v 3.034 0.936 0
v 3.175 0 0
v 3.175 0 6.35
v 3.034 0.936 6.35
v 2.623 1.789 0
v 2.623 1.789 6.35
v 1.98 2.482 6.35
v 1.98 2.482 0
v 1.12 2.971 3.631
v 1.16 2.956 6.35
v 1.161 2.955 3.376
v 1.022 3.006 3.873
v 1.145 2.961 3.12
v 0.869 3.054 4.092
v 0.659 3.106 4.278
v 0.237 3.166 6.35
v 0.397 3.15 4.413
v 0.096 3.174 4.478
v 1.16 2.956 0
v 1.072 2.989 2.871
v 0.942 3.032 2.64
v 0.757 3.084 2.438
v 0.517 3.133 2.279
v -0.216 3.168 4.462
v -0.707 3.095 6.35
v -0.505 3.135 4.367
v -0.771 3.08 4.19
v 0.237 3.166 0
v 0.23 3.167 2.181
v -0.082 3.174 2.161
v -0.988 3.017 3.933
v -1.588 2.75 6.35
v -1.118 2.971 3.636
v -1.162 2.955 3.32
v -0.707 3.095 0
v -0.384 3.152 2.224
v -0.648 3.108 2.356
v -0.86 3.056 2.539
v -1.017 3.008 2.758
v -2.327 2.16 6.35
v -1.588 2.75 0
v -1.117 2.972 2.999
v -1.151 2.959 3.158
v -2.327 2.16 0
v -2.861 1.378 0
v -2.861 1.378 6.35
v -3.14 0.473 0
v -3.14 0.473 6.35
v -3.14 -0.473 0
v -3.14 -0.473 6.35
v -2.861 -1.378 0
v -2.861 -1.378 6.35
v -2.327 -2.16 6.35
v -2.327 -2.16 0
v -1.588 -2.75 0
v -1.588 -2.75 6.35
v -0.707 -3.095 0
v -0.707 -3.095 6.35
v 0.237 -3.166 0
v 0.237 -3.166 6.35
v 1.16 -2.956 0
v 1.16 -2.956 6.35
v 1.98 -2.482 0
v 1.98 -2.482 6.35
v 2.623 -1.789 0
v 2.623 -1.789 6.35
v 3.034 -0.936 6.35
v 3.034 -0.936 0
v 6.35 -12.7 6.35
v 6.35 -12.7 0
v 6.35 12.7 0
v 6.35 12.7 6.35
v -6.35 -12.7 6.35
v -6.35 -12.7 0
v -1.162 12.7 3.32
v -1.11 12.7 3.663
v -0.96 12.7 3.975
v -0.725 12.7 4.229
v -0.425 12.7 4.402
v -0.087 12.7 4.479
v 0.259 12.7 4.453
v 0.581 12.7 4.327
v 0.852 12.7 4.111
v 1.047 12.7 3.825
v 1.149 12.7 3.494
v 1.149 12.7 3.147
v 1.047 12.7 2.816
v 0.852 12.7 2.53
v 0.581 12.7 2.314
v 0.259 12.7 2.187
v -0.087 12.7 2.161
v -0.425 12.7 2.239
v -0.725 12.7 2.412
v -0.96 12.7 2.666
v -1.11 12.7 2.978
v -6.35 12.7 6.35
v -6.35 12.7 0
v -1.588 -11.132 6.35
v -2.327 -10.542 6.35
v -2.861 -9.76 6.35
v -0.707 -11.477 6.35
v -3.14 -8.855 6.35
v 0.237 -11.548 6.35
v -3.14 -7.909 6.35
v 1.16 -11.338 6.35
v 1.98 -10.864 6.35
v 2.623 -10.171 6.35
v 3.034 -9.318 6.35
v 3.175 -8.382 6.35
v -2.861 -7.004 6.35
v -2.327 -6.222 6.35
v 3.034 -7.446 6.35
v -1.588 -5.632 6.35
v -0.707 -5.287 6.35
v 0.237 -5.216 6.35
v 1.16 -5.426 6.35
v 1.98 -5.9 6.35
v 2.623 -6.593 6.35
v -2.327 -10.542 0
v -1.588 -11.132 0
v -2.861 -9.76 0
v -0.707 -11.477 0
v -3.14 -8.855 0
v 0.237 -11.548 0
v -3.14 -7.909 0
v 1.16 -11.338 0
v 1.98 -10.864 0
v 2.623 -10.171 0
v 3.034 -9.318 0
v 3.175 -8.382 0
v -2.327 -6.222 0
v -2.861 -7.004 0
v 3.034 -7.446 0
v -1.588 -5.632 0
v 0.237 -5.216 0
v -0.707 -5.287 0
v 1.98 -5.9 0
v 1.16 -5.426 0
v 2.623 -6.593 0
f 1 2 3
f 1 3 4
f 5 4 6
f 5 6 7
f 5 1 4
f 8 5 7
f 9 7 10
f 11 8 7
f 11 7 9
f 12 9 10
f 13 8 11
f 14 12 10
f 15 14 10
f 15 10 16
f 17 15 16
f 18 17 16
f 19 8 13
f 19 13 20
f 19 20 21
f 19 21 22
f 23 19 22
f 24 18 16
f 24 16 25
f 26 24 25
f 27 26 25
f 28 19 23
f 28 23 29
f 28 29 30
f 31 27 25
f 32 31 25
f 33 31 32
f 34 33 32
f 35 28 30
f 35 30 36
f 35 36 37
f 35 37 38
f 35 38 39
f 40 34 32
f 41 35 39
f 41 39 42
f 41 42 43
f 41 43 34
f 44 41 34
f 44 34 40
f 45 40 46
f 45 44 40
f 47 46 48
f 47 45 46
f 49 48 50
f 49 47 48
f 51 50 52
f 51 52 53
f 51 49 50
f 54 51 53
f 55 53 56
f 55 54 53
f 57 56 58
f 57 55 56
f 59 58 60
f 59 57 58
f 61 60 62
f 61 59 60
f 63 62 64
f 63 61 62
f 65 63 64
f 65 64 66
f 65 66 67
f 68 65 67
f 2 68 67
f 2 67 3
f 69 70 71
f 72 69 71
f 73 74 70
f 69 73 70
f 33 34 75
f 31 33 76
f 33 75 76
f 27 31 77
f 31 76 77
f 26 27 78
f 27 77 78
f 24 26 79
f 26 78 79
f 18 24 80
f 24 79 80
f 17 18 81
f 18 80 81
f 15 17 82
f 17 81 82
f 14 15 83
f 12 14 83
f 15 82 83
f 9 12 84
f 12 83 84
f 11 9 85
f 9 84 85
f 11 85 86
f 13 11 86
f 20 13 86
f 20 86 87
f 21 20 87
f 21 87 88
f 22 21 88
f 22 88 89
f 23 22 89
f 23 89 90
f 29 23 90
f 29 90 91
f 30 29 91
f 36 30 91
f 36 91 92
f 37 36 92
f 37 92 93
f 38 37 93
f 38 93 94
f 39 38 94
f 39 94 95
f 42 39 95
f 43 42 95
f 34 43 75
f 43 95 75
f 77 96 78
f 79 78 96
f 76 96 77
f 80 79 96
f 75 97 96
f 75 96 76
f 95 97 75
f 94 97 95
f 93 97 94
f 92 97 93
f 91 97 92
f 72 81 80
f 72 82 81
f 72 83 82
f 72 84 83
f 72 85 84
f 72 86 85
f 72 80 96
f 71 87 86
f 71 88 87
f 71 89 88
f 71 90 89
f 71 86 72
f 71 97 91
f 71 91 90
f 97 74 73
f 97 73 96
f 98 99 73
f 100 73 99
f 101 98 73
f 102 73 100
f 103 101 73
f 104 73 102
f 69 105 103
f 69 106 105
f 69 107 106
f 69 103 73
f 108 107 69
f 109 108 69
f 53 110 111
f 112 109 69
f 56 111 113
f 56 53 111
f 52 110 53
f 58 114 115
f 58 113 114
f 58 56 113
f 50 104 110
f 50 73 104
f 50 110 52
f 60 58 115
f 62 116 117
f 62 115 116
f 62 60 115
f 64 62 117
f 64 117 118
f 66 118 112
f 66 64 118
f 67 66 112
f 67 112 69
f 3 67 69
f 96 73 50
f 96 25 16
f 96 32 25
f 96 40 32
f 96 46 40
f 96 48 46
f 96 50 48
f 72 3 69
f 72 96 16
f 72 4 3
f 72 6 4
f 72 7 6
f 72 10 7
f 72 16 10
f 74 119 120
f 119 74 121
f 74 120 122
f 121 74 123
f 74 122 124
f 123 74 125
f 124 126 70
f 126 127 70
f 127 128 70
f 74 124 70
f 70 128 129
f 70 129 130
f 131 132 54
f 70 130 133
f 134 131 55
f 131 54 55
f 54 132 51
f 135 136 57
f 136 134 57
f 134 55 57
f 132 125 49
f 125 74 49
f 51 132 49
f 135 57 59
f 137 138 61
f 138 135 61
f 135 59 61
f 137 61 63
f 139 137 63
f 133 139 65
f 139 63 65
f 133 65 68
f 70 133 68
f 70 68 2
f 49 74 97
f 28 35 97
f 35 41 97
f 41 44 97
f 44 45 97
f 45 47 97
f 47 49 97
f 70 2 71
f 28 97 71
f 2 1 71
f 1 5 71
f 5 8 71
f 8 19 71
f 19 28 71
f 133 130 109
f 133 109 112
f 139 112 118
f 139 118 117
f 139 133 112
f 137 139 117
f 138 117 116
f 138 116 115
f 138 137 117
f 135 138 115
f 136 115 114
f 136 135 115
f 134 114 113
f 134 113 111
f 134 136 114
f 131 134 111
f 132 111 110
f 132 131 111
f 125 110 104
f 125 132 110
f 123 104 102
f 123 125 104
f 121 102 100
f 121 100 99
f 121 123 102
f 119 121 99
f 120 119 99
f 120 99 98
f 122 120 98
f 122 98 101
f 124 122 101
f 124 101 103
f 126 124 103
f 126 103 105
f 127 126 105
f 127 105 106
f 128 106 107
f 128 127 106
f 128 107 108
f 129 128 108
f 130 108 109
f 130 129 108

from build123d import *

# Parameters (mm, degrees)
F0_W     = 12.7
F0_H     = 25.4
F0_R     = 3.175
F1_DEPTH = 6.35
F2_R     = 1.162114
F3_DEPTH = 10.16


with BuildPart() as f1:
    # F0 (on Top) → F1 (new body)
    with BuildSketch(Plane.XY):
        Rectangle(F0_W, F0_H)
        with Locations((0, -8.382)):
            Circle(F0_R, mode=Mode.SUBTRACT)
        Circle(F0_R, mode=Mode.SUBTRACT)
    extrude(amount=F1_DEPTH)

    # F2 (on face) → F3 (cut)
    with BuildSketch(Plane(origin=(0, 12.7, 0), x_dir=(-1, 0, 0), z_dir=(0, 1, 0))):
        with Locations((0, 3.320315)):
            Circle(F2_R)
    extrude(amount=-F3_DEPTH, mode=Mode.SUBTRACT)


solid = f1.part
